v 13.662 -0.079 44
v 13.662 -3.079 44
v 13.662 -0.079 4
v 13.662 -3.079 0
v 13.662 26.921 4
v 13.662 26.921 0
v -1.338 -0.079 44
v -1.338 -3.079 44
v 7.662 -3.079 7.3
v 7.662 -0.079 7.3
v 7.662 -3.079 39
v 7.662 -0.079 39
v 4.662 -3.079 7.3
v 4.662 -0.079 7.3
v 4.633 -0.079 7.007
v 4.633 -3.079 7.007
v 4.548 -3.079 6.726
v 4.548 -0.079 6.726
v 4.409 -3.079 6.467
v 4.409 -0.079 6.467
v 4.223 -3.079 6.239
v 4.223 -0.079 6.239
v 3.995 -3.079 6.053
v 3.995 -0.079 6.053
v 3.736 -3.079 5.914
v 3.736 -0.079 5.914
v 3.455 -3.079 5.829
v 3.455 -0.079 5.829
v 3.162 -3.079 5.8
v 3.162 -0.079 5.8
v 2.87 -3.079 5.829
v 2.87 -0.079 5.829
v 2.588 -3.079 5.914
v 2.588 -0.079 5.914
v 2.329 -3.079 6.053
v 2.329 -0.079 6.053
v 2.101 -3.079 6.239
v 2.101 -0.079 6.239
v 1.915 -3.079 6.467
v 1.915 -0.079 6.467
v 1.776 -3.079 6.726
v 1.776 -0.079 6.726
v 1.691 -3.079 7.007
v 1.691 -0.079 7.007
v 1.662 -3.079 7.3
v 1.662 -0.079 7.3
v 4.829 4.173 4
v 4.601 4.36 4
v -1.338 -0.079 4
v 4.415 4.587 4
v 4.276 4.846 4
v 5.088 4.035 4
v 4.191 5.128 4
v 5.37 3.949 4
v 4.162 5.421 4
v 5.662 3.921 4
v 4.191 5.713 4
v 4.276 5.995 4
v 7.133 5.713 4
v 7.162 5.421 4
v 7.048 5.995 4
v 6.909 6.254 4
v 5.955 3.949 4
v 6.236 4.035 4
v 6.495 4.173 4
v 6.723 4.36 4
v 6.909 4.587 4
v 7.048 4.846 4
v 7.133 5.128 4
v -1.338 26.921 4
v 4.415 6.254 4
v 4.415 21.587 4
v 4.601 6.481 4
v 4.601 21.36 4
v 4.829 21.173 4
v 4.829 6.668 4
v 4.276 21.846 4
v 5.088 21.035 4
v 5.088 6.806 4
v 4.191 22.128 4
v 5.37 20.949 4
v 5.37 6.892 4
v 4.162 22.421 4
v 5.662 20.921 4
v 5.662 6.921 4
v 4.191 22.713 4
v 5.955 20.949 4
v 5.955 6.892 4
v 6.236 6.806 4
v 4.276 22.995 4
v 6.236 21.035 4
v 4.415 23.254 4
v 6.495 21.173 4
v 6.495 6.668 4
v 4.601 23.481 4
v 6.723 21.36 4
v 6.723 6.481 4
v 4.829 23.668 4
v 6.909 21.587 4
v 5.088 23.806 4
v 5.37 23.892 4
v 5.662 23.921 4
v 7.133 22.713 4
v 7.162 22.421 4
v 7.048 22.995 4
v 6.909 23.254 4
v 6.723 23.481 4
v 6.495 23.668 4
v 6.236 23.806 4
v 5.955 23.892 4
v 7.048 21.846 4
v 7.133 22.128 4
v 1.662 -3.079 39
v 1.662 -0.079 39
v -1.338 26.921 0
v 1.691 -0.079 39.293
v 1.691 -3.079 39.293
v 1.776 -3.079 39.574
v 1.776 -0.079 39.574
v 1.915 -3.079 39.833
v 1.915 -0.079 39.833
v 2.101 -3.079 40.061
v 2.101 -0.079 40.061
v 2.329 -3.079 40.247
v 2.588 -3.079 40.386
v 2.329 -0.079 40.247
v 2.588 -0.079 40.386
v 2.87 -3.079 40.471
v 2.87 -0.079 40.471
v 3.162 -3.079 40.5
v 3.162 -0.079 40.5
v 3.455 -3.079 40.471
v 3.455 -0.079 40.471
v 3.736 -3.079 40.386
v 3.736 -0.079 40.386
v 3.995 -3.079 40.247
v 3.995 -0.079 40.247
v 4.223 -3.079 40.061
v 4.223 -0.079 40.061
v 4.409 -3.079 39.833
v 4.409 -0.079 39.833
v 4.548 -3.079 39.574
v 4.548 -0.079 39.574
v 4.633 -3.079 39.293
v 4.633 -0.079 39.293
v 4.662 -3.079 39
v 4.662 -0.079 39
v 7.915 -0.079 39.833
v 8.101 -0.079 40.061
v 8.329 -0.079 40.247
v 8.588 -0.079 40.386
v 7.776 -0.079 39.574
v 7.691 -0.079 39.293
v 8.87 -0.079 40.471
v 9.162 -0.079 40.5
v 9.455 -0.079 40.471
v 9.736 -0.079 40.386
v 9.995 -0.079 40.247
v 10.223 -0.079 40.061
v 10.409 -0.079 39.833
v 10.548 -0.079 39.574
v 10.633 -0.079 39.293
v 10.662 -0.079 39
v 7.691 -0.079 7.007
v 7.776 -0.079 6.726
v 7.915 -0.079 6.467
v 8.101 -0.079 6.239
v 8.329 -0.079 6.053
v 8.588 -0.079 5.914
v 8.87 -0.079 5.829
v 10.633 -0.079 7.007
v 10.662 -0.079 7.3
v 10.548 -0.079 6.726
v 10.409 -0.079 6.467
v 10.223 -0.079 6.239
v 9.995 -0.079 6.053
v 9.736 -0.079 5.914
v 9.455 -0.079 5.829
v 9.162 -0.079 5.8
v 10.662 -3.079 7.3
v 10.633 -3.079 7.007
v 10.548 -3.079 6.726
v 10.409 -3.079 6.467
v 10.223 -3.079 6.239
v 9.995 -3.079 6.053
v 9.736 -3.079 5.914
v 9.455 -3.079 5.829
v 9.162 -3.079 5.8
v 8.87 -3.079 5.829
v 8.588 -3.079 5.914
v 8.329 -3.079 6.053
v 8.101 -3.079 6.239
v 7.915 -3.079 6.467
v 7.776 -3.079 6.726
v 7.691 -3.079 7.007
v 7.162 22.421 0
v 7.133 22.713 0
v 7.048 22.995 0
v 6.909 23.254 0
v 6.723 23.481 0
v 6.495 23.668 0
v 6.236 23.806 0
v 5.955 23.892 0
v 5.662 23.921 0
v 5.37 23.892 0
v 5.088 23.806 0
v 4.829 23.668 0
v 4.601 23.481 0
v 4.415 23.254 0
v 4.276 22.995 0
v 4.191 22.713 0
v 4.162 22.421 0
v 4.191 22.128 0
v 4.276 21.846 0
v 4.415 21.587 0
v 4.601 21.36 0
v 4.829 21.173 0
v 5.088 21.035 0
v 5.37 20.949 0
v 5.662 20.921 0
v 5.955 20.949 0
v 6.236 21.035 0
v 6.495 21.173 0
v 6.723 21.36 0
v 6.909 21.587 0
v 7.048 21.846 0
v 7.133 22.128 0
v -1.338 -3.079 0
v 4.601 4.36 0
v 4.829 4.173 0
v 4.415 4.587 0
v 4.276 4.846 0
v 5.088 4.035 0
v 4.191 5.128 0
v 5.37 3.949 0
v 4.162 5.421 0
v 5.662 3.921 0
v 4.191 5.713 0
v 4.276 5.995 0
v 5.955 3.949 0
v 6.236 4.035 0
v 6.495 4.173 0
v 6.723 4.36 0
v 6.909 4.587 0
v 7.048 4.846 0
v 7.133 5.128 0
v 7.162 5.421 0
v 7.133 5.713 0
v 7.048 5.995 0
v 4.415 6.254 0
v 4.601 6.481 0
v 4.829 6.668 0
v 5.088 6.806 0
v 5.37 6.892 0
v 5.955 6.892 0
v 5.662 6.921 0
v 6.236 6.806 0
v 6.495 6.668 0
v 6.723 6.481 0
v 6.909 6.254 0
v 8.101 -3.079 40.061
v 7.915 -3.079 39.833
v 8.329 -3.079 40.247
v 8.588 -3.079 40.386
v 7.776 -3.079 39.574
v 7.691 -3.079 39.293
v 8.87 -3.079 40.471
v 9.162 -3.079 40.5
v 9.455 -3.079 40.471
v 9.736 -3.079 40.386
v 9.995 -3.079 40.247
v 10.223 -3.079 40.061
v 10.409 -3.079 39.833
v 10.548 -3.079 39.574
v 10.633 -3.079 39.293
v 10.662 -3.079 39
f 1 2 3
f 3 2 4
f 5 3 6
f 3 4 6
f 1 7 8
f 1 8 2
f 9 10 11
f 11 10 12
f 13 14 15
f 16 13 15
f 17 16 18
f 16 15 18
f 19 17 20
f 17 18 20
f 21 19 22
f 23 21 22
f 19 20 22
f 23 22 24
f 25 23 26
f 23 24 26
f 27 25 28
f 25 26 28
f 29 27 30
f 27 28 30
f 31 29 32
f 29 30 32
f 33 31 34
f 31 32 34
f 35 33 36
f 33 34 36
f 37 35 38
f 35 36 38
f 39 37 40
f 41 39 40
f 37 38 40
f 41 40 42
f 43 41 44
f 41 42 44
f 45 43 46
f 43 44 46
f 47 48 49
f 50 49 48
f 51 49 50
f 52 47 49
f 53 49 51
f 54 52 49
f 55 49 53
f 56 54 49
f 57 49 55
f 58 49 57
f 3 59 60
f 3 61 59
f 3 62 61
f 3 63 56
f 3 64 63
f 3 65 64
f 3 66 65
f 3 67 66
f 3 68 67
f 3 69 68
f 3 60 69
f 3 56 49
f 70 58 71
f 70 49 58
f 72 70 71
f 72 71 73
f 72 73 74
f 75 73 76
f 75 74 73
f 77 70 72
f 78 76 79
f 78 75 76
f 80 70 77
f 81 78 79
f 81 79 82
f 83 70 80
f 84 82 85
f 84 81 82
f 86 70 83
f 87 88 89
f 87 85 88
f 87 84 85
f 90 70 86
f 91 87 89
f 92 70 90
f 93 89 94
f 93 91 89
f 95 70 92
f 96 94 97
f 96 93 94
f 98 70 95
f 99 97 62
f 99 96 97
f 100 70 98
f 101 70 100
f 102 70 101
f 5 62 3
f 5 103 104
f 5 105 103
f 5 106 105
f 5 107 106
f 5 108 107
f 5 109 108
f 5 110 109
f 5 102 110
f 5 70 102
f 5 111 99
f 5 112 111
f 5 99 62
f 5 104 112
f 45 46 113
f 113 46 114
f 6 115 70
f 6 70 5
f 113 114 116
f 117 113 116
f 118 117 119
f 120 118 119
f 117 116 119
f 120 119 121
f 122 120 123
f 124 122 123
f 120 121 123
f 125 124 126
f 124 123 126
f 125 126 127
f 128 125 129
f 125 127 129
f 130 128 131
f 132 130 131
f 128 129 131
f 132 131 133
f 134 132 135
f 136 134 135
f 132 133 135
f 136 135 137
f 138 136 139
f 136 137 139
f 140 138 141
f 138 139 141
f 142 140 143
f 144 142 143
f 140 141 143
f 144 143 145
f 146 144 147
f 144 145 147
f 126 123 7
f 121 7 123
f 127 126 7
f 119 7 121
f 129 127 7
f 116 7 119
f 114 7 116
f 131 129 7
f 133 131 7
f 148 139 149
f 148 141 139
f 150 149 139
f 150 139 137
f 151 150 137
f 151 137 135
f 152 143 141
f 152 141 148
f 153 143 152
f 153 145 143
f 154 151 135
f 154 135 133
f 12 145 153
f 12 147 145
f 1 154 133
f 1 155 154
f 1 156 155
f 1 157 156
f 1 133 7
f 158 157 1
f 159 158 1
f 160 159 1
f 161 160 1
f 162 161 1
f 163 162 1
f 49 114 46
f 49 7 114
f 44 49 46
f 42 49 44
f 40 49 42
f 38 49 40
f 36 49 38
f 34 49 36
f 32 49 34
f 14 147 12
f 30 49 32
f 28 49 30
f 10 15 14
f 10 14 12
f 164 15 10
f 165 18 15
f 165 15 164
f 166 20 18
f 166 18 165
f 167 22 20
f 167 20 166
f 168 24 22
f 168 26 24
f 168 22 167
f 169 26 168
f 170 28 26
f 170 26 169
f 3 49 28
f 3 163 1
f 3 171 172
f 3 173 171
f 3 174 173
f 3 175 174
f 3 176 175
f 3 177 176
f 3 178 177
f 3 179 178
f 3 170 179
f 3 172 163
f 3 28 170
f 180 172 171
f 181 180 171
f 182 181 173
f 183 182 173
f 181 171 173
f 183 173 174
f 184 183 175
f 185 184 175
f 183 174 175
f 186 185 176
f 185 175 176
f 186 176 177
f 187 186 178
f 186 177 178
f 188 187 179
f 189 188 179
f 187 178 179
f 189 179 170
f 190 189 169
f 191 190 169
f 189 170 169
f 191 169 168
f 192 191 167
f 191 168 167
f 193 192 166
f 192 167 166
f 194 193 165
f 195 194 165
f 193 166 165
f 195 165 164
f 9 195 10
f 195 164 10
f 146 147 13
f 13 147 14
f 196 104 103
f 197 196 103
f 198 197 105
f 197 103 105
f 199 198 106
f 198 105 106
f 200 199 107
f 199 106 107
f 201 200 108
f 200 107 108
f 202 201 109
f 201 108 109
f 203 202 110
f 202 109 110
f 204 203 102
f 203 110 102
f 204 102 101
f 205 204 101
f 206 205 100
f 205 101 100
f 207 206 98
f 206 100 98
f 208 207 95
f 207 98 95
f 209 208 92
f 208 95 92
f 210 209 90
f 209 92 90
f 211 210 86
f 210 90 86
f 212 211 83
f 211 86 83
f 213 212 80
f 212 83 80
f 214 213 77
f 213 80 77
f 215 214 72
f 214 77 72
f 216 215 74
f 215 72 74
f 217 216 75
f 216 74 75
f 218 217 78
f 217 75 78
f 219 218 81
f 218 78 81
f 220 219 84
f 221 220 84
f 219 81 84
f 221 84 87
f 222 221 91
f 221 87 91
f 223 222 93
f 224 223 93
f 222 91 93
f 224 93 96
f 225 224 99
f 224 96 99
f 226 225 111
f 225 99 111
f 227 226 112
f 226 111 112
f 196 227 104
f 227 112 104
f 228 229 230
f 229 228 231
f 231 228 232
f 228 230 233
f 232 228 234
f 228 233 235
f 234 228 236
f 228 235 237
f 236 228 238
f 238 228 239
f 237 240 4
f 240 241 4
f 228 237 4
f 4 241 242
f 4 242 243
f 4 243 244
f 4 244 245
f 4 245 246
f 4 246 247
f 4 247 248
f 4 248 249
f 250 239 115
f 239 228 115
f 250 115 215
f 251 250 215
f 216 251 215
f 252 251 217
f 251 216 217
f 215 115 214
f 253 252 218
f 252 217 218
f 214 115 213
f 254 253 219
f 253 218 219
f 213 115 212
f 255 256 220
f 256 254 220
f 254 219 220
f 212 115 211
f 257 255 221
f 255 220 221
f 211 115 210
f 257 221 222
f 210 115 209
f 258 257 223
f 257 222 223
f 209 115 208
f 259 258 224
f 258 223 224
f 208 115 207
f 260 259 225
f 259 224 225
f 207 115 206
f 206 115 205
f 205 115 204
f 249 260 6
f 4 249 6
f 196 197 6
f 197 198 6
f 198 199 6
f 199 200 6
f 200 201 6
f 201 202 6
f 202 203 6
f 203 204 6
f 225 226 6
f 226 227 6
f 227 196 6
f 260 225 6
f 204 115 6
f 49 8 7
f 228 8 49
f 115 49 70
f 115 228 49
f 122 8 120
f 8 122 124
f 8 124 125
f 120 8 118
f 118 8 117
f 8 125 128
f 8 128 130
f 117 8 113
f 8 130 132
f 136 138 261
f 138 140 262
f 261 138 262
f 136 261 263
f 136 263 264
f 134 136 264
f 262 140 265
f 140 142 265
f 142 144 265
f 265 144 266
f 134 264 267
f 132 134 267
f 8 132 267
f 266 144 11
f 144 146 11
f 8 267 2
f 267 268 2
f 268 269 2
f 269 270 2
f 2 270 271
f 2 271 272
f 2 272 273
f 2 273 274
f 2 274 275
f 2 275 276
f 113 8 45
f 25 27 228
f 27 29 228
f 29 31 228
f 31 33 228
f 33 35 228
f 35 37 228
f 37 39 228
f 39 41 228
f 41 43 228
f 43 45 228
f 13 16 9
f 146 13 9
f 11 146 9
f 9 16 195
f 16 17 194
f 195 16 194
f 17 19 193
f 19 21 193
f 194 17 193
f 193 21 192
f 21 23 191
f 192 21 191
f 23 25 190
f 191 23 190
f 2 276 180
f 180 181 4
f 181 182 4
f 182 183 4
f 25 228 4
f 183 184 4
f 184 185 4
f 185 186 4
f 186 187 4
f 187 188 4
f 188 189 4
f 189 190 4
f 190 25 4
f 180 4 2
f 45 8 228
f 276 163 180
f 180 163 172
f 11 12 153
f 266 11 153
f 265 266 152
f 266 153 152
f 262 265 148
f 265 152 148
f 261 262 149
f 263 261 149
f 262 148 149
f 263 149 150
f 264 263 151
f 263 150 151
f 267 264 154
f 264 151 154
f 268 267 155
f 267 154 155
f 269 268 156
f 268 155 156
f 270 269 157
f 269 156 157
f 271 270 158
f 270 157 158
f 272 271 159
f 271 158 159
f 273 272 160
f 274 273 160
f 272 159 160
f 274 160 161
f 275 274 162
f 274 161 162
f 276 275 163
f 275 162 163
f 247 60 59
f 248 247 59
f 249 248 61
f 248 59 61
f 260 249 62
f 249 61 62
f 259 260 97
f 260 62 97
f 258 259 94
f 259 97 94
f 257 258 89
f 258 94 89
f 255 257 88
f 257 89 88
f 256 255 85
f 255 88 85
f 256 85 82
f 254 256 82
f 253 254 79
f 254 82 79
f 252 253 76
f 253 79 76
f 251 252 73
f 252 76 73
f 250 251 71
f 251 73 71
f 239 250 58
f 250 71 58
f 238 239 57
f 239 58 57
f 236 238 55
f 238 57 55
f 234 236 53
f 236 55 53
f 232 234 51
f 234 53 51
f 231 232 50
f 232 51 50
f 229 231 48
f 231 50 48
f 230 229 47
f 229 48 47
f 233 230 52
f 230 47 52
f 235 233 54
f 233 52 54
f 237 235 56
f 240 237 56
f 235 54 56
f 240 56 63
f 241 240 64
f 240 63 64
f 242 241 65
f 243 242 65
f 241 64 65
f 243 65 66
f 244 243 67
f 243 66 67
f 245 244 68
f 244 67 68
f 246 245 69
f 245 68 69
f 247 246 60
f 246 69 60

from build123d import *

# Parameters (mm, degrees)
F0_W     = 15
F0_H     = 30
F1_DEPTH = 4
F2_R     = 1.5
F3_DEPTH = 4
F4_W     = 15
F4_H     = 3
F5_DEPTH = 40
F7_DEPTH = 5.334


with BuildPart() as f1:
    # F0 (on Top) → F1 (new body)
    with BuildSketch(Plane.XY):
        with Locations((6.162141, 11.920514)):
            Rectangle(F0_W, F0_H)
    extrude(amount=F1_DEPTH)

    # F2 (on face) → F3 (cut)
    with BuildSketch(Plane.XY.offset(4)):
        with Locations((5.662141, 5.420514)):
            Circle(F2_R)
        with Locations((5.662141, 22.420514)):
            Circle(F2_R)
    extrude(amount=-F3_DEPTH, mode=Mode.SUBTRACT)

    # F4 (on face) → F5 (join)
    with BuildSketch(Plane.XY.offset(4)):
        with Locations((6.162141, -1.579486)):
            Rectangle(F4_W, F4_H)
    extrude(amount=F5_DEPTH)

    # F6 (on face) → F7 (cut)
    with BuildSketch(Plane(origin=(0, -0.079486, 0), x_dir=(-1, 0, 0), z_dir=(0, 1, 0))):
        with BuildLine():
            Line((-10.662141, 39), (-7.662141, 39))
            ThreePointArc((-7.662141, 39), (-9.162141, 40.5), (-10.662141, 39))
        make_face()
        with BuildLine():
            ThreePointArc((-10.662141, 39), (-9.162141, 37.5), (-7.662141, 39))
            Line((-7.662141, 39), (-10.662141, 39))
        make_face()
        with BuildLine():
            Line((-7.662141, 7.299973), (-7.662141, 39))
            ThreePointArc((-7.662141, 39), (-9.162141, 37.5), (-10.662141, 39))
            Line((-10.662141, 39), (-10.662141, 7.299973))
            ThreePointArc((-10.662141, 7.299973), (-9.162141, 8.799973), (-7.662141, 7.299973))
        make_face()
        with BuildLine():
            Line((-10.662141, 7.299973), (-7.662141, 7.299973))
            ThreePointArc((-7.662141, 7.299973), (-9.162141, 8.799973), (-10.662141, 7.299973))
        make_face()
        with BuildLine():
            ThreePointArc((-4.662141, 7.299973), (-3.162141, 5.799973), (-1.662141, 7.299973))
            Line((-1.662141, 7.299973), (-4.662141, 7.299973))
        make_face()
        with BuildLine():
            Line((-4.662141, 7.299973), (-1.662141, 7.299973))
            ThreePointArc((-1.662141, 7.299973), (-3.162141, 8.799973), (-4.662141, 7.299973))
        make_face()
        with BuildLine():
            ThreePointArc((-10.662141, 7.299973), (-9.162141, 5.799973), (-7.662141, 7.299973))
            Line((-7.662141, 7.299973), (-10.662141, 7.299973))
        make_face()
        with BuildLine():
            Line((-1.662141, 7.299973), (-1.662141, 39))
            ThreePointArc((-1.662141, 39), (-3.162141, 37.5), (-4.662141, 39))
            Line((-4.662141, 39), (-4.662141, 7.299973))
            ThreePointArc((-4.662141, 7.299973), (-3.162141, 8.799973), (-1.662141, 7.299973))
        make_face()
        with BuildLine():
            ThreePointArc((-4.662141, 39), (-3.162141, 37.5), (-1.662141, 39))
            Line((-1.662141, 39), (-4.662141, 39))
        make_face()
        with BuildLine():
            Line((-4.662141, 39), (-1.662141, 39))
            ThreePointArc((-1.662141, 39), (-3.162141, 40.5), (-4.662141, 39))
        make_face()
    extrude(amount=-F7_DEPTH, mode=Mode.SUBTRACT)


solid = f1.part
